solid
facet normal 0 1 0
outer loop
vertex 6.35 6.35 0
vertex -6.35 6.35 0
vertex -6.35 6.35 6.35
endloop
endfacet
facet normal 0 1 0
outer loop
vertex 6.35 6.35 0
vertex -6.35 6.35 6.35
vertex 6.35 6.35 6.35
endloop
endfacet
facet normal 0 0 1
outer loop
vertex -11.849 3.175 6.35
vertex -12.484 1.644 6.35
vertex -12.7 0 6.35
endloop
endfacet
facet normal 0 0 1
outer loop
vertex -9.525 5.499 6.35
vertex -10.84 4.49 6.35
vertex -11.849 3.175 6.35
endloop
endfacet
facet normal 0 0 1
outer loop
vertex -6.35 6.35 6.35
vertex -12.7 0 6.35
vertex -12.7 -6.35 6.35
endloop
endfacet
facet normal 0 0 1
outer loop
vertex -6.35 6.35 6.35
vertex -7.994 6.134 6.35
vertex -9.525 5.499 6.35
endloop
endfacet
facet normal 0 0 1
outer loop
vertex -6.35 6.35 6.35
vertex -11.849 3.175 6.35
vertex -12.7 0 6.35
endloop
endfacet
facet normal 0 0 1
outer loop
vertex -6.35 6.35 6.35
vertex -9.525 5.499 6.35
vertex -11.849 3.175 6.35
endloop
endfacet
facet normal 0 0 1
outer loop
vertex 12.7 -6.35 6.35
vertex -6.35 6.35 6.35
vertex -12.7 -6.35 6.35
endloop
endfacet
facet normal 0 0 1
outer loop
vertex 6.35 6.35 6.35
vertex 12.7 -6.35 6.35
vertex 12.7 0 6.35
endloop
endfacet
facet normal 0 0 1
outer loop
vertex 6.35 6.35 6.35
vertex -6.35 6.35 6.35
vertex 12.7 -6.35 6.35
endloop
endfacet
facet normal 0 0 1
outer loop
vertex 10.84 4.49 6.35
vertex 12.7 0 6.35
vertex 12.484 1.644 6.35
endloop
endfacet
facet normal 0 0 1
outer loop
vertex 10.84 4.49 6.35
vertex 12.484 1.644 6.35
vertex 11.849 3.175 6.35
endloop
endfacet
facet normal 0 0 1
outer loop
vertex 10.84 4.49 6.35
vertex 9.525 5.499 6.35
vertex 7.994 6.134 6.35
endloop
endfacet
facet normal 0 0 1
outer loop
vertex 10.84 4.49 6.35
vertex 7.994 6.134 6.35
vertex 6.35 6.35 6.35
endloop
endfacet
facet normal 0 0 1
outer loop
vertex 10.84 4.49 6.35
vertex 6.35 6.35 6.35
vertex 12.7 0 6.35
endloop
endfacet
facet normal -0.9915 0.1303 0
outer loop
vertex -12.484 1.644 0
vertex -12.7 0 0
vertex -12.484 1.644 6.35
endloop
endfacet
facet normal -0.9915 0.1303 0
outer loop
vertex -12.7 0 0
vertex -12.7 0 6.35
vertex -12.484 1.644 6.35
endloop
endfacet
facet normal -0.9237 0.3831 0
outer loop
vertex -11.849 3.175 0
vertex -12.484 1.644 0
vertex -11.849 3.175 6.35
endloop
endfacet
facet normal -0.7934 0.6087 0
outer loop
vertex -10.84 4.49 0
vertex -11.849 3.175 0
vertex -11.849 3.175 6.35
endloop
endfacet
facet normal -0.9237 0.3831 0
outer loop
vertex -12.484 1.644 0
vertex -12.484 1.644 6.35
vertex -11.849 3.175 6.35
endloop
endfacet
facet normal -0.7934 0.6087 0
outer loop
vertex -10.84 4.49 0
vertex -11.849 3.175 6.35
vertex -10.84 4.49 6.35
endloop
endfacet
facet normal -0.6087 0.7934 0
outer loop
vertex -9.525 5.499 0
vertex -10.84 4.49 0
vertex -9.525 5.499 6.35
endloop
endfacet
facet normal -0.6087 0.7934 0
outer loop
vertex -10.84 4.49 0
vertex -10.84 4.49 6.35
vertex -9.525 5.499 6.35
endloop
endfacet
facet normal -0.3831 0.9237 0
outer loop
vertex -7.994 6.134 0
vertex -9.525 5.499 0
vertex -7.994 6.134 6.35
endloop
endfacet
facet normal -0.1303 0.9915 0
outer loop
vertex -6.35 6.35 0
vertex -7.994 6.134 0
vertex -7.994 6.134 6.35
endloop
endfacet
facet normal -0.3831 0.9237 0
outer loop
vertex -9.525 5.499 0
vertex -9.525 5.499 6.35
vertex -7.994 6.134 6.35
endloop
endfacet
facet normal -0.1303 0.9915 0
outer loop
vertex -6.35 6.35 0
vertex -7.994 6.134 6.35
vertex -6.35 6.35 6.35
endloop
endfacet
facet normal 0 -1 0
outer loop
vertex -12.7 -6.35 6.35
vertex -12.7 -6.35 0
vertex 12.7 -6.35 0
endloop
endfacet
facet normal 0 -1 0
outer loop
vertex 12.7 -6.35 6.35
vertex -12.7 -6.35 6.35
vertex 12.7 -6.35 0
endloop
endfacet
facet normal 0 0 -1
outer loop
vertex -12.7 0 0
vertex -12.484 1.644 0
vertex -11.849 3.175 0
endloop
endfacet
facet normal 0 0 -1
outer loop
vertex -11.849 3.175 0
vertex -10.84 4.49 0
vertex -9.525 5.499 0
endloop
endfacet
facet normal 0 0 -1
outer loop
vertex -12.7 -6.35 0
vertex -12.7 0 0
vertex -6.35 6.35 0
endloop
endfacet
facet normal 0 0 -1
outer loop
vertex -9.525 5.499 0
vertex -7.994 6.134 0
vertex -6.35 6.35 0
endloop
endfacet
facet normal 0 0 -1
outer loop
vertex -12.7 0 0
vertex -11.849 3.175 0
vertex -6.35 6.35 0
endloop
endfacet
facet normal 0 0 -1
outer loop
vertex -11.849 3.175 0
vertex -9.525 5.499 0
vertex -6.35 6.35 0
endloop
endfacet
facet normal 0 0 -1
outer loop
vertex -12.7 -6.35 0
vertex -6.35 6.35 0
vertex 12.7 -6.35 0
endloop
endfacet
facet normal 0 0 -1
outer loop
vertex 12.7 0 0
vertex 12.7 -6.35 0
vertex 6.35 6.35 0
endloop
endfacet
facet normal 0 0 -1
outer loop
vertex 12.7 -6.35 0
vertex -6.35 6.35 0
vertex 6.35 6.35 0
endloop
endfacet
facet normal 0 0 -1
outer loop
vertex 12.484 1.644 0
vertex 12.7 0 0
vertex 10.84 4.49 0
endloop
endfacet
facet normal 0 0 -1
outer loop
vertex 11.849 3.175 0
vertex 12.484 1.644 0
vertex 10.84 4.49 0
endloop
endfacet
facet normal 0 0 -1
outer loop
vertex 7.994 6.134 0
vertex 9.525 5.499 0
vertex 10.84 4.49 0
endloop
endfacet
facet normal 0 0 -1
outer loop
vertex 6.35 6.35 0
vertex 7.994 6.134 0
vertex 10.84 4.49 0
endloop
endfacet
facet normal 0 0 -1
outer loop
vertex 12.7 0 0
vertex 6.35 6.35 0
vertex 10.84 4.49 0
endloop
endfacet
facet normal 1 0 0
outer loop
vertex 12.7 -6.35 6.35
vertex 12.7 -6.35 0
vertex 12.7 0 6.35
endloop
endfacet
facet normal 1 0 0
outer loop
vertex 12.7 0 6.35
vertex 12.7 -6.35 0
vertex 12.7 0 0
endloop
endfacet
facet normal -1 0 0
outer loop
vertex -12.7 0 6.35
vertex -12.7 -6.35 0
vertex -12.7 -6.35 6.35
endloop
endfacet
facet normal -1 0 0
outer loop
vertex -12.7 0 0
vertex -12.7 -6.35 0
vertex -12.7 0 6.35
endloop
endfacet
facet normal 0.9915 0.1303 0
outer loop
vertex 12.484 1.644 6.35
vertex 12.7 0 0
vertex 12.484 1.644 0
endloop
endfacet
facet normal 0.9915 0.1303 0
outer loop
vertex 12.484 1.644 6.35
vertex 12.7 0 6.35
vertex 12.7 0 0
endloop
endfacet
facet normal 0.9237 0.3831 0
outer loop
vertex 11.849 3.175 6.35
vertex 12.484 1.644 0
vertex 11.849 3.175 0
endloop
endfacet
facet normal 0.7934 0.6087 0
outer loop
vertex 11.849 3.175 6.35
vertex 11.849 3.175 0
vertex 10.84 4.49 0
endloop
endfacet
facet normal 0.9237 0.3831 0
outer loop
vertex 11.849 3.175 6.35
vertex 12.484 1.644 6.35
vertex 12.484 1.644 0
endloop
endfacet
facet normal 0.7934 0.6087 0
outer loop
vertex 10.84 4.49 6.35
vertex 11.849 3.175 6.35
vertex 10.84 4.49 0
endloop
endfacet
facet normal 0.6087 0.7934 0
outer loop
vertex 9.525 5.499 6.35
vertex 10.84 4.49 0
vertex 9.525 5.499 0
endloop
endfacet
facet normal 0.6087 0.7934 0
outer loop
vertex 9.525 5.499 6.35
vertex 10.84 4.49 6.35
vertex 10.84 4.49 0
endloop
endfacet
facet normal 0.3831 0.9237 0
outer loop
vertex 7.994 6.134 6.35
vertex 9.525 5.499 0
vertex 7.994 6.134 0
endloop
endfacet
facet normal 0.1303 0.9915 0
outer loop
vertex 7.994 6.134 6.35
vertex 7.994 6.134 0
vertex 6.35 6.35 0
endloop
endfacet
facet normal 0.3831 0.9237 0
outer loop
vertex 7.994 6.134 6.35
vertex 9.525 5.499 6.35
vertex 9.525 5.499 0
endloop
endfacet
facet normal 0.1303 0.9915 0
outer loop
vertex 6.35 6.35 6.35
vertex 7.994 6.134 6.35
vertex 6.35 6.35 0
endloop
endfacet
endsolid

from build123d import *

# Parameters (mm, degrees)
ESQUISSE2_W        = 25.4
ESQUISSE2_H        = 12.7
BOSS_EXTRU_1_DEPTH = 6.35
CONG_1_R           = 6.35


with BuildPart() as part:
    # Esquisse2 → Boss.-Extru.1 (new body)
    with BuildSketch(Plane.XY):
        Rectangle(ESQUISSE2_W, ESQUISSE2_H)
    extrude(amount=BOSS_EXTRU_1_DEPTH)

    # Congé1
    cong_1_edges = [part.edges().sort_by_distance(p)[0] for p in [
        (-12.7, 6.35, 3.175),
        (12.7, 6.35, 3.175),
    ]]
    fillet(cong_1_edges, radius=CONG_1_R)


solid = part.part
